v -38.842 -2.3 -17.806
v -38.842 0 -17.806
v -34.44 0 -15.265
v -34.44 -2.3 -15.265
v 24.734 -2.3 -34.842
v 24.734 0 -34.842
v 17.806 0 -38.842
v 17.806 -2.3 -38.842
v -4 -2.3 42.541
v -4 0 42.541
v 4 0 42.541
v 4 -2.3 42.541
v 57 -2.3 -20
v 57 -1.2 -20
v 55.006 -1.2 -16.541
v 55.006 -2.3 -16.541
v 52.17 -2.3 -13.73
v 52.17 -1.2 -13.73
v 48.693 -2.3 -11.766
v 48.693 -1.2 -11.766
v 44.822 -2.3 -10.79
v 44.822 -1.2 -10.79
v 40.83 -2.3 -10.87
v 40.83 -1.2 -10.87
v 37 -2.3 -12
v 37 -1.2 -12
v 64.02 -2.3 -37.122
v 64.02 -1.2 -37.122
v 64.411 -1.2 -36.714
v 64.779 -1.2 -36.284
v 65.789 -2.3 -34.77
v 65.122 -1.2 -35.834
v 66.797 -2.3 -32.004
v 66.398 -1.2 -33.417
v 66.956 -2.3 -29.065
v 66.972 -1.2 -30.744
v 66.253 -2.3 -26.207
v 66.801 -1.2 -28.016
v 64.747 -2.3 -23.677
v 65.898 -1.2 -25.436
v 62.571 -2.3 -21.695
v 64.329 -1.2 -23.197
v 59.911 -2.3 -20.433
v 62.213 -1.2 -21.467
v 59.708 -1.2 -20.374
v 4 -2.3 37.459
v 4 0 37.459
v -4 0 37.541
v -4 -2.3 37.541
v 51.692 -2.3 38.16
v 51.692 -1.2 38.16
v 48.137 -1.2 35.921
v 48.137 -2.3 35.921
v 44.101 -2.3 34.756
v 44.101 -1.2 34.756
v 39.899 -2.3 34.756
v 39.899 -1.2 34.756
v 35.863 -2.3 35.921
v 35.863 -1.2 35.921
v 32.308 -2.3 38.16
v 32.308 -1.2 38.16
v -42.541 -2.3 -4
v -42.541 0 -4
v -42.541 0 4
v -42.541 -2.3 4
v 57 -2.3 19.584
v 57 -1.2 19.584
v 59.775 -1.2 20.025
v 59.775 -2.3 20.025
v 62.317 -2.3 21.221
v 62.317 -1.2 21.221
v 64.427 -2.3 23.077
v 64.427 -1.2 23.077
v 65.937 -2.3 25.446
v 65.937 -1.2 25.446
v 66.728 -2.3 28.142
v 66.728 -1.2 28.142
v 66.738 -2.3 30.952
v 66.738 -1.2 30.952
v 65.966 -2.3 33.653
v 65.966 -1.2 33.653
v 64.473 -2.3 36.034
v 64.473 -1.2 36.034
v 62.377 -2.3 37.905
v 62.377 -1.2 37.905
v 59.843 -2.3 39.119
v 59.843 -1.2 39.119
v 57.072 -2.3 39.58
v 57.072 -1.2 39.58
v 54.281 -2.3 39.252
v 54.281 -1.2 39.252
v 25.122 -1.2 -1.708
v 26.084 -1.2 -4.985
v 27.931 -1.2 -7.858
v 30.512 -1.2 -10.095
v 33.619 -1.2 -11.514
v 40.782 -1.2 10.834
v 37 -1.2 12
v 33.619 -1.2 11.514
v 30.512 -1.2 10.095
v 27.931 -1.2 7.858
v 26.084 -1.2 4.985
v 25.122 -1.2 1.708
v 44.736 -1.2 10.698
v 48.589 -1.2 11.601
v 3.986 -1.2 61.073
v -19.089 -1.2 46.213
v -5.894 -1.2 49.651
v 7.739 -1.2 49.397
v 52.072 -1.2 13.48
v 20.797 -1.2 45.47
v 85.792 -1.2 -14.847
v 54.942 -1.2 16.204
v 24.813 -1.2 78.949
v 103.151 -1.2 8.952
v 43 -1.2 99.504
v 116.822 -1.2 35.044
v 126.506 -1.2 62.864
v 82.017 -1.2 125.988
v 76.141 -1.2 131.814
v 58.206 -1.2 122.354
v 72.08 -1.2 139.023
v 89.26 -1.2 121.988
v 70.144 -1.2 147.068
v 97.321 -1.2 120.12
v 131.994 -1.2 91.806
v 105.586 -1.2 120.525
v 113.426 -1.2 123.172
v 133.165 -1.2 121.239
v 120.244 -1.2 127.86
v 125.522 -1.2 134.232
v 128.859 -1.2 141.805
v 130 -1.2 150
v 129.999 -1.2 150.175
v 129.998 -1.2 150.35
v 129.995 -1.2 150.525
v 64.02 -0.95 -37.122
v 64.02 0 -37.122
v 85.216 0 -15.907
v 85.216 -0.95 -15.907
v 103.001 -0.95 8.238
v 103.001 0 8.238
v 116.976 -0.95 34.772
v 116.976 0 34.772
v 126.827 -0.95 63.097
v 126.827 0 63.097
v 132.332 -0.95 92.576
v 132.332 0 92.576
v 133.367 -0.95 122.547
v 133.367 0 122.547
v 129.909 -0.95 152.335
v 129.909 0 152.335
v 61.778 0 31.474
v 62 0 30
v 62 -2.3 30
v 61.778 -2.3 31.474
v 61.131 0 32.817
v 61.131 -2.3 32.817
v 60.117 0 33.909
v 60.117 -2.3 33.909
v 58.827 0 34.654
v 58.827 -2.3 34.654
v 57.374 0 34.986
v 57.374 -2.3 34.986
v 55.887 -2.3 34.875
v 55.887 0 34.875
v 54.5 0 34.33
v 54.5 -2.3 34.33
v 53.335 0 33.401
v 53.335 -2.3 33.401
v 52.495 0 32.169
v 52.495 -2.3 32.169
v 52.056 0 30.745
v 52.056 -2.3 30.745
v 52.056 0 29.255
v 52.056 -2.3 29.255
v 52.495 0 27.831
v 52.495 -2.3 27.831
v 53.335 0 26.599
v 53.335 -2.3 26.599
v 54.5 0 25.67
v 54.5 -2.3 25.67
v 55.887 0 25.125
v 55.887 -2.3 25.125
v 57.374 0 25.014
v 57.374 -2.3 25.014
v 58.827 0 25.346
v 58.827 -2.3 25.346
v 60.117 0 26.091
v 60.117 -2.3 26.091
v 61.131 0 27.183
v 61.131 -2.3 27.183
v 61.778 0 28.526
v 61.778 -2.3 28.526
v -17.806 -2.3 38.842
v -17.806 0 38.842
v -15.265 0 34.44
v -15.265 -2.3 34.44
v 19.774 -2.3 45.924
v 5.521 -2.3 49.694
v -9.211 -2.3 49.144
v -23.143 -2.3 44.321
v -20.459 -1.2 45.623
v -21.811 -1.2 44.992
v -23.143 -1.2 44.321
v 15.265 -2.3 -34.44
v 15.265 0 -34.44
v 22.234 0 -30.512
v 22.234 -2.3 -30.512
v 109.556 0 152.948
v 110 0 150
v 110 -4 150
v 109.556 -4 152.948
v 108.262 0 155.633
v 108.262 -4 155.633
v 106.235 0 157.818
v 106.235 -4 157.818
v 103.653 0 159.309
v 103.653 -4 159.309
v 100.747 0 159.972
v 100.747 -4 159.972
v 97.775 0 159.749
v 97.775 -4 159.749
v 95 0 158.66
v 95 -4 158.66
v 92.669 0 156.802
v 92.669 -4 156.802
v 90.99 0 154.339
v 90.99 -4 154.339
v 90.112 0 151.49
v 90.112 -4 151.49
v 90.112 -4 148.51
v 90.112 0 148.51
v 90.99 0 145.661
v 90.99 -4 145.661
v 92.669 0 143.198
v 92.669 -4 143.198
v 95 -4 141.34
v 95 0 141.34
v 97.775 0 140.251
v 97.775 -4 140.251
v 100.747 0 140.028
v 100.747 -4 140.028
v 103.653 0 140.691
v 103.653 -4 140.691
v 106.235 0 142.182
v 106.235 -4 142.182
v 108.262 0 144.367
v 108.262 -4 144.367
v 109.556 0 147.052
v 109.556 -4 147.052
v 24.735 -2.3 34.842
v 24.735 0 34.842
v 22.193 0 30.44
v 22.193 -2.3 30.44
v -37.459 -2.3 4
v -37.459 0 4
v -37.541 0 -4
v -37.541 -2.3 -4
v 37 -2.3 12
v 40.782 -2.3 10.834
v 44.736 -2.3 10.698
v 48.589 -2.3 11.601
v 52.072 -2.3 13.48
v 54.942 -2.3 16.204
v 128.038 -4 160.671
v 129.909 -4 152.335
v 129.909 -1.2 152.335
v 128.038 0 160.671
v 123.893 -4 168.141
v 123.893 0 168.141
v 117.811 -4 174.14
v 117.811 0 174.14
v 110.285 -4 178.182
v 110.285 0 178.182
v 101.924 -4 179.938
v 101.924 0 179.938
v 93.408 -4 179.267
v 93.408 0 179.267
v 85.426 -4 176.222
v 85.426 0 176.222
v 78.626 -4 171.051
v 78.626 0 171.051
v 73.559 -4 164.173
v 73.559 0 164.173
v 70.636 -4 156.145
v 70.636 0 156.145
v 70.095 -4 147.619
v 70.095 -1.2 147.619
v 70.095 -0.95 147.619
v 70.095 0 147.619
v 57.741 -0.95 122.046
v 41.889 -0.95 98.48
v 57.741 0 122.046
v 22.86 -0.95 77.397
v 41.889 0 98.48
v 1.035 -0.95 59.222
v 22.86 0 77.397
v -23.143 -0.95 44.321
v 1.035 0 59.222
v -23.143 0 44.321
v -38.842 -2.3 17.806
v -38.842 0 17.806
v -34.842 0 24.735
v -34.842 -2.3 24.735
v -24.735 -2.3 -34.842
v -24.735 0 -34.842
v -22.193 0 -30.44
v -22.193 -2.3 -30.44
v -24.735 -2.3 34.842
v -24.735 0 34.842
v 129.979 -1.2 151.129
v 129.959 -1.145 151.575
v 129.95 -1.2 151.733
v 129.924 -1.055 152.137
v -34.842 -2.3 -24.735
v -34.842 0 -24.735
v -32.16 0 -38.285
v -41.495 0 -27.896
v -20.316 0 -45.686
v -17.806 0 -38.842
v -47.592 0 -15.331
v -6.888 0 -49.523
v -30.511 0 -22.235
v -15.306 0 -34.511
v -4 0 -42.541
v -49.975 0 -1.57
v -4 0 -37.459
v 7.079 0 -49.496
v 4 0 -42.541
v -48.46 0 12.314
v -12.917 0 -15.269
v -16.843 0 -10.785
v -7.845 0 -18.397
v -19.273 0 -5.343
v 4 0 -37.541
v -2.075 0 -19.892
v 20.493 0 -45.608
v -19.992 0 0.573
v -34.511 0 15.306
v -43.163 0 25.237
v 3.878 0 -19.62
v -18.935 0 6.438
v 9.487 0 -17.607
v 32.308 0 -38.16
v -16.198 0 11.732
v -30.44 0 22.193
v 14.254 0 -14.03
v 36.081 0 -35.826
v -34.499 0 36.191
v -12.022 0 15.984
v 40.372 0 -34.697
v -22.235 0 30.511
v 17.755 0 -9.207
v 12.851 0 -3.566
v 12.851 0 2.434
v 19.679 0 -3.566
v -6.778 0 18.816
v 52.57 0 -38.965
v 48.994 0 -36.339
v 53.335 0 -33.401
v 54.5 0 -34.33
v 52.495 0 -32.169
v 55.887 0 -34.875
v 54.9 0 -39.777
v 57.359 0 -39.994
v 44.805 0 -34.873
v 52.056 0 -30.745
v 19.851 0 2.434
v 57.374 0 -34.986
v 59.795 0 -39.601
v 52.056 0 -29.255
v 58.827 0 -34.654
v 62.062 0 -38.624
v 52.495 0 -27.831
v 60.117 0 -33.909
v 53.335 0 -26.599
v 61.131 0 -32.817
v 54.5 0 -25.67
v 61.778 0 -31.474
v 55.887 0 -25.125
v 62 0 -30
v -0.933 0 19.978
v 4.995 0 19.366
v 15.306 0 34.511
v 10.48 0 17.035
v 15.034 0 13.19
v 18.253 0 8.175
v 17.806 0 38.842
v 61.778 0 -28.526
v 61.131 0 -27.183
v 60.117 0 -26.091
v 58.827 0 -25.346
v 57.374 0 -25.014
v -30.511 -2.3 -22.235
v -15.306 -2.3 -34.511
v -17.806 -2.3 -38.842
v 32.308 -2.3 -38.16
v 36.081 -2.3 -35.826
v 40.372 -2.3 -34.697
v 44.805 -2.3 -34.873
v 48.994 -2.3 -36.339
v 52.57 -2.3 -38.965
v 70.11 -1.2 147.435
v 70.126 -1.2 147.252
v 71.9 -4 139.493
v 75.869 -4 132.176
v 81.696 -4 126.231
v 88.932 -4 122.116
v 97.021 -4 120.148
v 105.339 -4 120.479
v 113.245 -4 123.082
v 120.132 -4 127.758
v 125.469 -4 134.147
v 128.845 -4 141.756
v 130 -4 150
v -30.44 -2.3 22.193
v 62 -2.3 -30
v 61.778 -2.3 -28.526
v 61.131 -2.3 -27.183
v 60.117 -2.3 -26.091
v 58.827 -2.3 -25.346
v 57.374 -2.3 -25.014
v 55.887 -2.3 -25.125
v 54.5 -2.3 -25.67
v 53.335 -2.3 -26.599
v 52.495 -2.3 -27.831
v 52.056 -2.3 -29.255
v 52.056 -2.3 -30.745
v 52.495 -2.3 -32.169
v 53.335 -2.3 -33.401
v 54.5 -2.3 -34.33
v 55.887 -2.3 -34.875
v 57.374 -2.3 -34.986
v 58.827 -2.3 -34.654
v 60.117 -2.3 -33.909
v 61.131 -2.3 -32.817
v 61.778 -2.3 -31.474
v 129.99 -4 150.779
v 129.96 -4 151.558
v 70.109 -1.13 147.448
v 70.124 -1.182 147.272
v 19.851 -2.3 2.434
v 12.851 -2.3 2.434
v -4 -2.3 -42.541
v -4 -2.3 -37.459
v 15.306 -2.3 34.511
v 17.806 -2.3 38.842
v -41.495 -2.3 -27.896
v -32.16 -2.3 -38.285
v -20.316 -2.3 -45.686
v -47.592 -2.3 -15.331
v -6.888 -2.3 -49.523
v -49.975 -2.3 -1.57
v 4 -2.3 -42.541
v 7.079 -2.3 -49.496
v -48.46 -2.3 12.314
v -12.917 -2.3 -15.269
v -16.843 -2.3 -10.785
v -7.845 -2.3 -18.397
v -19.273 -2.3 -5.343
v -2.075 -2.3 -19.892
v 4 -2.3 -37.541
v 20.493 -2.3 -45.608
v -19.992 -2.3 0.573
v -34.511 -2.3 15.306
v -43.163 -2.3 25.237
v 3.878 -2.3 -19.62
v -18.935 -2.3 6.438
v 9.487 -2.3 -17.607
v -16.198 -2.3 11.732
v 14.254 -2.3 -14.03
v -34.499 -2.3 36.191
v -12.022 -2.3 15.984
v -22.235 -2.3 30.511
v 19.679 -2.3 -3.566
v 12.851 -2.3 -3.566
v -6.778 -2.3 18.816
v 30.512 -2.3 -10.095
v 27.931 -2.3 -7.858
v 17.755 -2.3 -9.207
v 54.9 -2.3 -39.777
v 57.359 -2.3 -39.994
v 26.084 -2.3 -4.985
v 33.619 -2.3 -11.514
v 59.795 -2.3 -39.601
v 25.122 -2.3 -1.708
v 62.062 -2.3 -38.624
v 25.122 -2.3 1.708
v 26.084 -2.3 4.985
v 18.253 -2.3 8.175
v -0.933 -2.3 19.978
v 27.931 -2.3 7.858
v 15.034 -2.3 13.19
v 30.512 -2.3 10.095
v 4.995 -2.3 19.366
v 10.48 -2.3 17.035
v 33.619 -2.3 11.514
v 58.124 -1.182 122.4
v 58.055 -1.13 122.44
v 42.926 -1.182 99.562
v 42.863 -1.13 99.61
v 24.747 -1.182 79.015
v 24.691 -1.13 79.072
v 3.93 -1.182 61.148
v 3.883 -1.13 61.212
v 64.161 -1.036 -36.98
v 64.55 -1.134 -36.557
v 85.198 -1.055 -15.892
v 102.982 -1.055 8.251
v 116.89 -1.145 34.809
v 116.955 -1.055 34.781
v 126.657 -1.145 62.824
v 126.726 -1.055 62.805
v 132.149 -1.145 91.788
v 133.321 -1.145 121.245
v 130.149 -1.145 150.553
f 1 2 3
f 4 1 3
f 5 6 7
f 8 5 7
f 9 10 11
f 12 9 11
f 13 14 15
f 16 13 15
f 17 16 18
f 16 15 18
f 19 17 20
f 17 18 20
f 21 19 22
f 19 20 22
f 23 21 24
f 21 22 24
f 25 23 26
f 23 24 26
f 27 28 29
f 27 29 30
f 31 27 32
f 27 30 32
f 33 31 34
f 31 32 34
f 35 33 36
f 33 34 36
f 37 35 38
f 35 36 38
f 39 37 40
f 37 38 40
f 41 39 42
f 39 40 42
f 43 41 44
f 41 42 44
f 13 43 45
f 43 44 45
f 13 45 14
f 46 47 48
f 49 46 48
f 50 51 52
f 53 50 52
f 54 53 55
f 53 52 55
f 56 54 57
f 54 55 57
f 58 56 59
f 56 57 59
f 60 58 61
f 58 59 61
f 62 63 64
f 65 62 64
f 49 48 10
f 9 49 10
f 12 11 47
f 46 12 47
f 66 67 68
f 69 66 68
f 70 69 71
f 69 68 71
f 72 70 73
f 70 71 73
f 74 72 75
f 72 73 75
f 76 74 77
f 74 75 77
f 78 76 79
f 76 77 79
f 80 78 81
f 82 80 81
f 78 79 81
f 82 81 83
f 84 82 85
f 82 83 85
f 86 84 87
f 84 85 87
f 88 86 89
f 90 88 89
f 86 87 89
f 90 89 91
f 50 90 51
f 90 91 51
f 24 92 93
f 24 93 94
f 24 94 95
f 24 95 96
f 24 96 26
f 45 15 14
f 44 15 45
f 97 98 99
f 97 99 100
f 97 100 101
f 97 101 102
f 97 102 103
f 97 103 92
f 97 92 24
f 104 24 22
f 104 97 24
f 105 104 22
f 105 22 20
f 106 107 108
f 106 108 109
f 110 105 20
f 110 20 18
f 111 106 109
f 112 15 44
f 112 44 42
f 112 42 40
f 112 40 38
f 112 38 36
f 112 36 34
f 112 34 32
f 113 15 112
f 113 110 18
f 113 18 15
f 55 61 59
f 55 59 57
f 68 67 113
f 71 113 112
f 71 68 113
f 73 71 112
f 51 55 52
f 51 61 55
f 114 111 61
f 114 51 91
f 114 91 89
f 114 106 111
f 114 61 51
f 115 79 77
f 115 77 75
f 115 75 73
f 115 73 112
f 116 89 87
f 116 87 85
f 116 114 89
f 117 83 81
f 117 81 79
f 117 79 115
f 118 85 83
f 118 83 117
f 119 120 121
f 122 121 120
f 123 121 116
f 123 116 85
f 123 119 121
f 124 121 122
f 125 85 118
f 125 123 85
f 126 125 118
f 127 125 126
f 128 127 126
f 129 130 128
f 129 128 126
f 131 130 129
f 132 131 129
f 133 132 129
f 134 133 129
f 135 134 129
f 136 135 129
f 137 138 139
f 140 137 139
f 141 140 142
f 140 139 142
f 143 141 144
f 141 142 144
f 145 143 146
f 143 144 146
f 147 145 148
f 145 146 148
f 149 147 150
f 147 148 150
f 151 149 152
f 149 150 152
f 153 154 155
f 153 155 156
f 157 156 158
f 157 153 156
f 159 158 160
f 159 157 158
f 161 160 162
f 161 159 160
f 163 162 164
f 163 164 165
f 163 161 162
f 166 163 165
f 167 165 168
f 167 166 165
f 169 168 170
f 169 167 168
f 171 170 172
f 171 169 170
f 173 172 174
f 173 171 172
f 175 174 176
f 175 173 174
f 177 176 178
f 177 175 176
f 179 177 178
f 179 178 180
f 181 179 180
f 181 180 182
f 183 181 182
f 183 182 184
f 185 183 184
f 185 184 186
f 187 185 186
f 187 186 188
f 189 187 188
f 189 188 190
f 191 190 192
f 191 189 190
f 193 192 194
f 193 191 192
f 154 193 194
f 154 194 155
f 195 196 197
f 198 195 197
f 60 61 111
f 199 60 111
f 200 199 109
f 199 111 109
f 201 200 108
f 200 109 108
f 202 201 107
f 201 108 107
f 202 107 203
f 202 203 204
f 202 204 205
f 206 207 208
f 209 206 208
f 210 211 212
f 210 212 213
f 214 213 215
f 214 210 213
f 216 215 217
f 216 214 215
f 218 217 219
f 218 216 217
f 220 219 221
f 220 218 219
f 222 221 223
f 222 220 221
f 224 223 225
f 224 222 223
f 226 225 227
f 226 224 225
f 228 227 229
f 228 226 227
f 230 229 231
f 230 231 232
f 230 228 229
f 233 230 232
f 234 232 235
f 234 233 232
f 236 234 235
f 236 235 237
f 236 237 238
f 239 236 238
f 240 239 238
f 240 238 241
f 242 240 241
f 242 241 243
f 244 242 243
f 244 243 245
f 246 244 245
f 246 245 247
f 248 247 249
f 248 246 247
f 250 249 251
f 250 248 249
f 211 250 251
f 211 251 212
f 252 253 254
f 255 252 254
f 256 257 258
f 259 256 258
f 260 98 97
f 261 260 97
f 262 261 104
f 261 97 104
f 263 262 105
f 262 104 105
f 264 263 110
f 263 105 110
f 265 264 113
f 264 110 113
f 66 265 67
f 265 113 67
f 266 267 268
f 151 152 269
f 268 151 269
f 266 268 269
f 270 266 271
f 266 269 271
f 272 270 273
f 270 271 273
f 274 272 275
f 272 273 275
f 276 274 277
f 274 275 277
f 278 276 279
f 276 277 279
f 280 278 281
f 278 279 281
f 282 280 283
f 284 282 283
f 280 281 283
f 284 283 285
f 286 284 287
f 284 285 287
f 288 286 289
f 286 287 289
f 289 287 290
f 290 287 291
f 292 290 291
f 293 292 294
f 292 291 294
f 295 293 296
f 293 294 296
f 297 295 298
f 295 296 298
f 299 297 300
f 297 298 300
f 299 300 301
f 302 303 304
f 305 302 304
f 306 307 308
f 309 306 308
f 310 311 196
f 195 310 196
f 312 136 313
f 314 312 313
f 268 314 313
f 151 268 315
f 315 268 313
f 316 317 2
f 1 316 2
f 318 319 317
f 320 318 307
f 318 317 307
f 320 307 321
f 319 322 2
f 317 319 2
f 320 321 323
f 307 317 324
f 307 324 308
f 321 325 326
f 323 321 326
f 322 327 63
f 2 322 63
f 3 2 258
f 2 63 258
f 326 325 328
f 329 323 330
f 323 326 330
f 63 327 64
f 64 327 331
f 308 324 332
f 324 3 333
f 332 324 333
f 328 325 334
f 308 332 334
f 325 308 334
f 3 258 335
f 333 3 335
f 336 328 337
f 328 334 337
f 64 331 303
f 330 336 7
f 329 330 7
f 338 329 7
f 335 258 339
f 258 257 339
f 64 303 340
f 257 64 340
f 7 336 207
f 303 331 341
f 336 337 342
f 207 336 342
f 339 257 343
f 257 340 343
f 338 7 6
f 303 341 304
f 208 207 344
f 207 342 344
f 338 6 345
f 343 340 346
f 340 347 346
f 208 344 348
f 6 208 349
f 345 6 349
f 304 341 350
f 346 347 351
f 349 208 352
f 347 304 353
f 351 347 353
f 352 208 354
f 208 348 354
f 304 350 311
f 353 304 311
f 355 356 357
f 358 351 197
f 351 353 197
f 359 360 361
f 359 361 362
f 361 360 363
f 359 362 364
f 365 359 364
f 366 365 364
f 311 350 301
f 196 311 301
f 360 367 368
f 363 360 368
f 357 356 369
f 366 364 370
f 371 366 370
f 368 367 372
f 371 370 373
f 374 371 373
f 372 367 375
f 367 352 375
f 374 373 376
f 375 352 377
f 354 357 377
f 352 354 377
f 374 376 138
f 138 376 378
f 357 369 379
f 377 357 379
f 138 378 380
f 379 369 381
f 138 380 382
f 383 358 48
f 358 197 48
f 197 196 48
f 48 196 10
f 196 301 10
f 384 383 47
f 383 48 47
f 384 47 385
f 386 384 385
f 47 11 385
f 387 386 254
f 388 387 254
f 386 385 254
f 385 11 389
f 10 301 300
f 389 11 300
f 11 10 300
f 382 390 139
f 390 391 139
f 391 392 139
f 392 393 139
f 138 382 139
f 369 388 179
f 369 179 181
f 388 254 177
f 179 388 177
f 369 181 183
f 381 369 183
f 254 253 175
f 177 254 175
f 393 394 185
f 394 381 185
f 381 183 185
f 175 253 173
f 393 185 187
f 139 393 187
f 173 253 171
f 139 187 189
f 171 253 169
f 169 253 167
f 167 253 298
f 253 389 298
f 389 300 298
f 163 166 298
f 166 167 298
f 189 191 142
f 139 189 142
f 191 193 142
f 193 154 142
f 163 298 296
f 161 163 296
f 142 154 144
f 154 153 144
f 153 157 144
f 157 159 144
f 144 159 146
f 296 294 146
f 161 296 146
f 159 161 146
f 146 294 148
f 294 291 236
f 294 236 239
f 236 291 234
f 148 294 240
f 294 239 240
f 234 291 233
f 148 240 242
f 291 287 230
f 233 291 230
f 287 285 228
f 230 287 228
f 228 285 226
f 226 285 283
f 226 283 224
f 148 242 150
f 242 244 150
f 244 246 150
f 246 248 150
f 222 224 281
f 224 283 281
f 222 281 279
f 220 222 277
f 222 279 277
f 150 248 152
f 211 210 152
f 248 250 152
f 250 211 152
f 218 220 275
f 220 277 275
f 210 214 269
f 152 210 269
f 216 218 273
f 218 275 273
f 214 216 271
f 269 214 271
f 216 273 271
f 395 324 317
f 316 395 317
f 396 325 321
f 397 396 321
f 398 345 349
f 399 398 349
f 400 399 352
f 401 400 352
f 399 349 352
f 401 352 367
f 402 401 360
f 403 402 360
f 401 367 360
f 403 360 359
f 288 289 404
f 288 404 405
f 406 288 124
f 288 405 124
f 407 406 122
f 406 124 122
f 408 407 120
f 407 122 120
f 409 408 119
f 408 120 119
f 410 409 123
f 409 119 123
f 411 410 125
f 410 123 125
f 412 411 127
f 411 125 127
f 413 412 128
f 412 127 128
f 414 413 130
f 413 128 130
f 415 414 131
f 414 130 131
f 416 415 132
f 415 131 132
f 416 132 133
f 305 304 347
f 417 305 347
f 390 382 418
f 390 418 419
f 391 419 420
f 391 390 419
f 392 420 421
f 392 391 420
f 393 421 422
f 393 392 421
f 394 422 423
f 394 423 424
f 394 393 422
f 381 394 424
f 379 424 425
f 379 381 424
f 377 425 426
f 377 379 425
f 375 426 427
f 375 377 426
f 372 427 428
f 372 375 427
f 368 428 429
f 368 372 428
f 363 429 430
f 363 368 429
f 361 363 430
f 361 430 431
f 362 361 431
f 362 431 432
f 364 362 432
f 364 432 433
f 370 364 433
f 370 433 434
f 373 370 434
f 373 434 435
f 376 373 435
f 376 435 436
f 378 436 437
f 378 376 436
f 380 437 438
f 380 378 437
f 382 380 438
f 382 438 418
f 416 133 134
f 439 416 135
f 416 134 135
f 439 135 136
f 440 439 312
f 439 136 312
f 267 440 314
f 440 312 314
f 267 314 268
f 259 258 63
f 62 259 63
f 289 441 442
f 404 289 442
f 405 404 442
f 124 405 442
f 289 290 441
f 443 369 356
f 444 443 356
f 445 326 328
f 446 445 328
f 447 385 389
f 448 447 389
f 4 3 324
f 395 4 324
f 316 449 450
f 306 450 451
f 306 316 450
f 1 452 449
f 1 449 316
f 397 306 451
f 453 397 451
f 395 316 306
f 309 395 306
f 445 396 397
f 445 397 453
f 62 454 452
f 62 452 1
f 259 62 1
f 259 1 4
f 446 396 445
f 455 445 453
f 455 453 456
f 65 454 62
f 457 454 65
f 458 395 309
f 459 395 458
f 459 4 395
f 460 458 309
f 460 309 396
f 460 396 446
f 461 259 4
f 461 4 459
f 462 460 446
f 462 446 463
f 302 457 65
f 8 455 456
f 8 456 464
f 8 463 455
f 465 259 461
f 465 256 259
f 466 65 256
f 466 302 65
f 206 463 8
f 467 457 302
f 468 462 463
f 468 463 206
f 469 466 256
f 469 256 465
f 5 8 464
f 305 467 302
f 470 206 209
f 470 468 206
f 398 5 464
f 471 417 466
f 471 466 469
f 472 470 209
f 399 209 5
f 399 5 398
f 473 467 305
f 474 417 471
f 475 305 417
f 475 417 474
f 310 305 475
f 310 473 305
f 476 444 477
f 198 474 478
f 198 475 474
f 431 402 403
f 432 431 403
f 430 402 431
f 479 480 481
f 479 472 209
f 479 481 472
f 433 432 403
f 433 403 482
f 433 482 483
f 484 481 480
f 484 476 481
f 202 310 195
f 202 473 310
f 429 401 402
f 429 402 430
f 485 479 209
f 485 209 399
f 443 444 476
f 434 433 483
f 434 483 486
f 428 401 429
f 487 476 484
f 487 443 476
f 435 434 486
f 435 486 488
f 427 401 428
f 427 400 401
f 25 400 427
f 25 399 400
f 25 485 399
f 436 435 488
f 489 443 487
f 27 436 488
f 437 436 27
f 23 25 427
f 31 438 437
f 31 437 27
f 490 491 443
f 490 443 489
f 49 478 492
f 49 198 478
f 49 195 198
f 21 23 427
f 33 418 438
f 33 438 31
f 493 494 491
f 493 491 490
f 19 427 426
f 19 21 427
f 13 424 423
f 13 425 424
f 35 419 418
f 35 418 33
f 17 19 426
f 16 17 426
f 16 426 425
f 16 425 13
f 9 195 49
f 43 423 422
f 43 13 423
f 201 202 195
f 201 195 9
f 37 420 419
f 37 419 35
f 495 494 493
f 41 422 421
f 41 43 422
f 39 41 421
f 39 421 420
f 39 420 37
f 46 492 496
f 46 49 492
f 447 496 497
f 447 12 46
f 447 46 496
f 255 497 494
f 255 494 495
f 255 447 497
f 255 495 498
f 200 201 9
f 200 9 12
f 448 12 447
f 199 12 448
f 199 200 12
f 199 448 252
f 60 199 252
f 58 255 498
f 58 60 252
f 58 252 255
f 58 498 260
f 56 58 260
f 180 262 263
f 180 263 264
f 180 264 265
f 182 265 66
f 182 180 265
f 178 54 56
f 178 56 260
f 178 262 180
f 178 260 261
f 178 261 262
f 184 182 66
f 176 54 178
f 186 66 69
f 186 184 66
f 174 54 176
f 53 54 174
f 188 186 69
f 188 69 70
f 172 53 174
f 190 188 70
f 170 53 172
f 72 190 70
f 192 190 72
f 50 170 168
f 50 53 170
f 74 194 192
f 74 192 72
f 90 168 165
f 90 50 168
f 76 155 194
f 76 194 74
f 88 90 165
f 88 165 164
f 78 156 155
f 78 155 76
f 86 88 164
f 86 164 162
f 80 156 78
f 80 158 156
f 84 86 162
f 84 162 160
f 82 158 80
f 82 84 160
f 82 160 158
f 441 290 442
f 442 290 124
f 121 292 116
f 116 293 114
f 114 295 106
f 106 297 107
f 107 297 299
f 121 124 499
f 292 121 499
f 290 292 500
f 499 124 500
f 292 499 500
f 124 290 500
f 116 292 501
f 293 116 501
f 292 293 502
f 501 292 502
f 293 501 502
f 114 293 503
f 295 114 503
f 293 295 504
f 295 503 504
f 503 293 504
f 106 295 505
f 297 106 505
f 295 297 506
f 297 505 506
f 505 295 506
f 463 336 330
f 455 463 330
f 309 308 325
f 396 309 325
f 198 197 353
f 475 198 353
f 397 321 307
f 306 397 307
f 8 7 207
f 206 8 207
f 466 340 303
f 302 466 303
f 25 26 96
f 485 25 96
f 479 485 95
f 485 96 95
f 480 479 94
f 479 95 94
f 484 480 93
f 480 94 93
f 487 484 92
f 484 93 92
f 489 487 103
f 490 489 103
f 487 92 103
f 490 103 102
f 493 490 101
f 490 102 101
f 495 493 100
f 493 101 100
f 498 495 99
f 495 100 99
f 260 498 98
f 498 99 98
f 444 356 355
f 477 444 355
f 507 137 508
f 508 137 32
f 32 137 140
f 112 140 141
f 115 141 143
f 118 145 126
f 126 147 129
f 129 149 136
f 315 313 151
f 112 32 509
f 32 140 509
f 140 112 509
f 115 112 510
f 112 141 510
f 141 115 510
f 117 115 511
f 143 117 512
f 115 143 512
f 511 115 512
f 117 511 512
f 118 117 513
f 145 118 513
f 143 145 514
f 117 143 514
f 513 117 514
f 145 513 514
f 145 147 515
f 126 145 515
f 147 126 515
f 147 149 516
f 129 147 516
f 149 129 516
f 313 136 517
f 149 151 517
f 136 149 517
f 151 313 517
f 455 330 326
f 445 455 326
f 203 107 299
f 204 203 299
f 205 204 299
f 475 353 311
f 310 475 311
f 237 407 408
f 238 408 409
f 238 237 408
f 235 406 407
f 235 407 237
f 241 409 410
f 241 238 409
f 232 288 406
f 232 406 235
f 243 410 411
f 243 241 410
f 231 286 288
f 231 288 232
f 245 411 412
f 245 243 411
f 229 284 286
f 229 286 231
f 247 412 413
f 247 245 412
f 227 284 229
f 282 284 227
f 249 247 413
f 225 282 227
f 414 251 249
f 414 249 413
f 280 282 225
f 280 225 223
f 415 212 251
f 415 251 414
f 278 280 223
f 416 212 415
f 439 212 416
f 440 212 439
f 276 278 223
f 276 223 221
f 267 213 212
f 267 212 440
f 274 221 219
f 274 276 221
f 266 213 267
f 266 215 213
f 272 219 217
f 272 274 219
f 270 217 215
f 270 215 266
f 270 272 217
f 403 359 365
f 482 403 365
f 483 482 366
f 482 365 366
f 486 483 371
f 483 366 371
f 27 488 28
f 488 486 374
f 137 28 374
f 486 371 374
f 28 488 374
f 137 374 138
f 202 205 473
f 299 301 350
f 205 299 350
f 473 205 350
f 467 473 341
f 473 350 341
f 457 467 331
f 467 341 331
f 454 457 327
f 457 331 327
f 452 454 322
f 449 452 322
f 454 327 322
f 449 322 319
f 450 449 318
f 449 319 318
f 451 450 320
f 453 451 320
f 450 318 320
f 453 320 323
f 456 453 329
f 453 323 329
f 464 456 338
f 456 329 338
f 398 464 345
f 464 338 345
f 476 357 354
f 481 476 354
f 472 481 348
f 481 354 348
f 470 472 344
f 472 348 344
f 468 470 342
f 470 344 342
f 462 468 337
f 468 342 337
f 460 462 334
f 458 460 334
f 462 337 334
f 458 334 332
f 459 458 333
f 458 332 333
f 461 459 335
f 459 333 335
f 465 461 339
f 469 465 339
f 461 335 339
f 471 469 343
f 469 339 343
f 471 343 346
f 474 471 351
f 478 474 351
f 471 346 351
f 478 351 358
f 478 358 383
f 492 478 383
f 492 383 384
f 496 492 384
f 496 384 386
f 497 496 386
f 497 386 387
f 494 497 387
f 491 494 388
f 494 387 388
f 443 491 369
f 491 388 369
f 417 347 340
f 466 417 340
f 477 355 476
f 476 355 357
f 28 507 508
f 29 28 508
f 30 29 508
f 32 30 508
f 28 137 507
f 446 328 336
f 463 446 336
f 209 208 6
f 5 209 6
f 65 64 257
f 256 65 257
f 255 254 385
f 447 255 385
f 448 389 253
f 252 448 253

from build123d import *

# Parameters (mm, degrees)
F0_R        = 5
F1_DEPTH    = 2.3
F2_DEPTH    = 1.2
F0_R_2      = 10
F3_DEPTH    = 4
F4_T4_ANGLE = 61.2690035525
F4_S5_R     = 30
F4_T6_DEPTH = 114
F4_S7_R     = 10
F4_T8_DEPTH = 114
F5_T4_ANGLE = 41.074053593
F5_S5_R     = 30
F5_T6_DEPTH = 82
F5_S7_R     = 50
F5_T8_DEPTH = 82


# Not quite as in the source:
# - a fillet or chamfer that OpenCascade refuses, or shapes differently, is made with other operations: its cross-section is extruded or revolved along the edge and cut away or added


with BuildPart() as f1:
    # F0 (on Front) → F1 (new body)
    with BuildSketch(Plane.XZ):
        with BuildLine():
            ThreePointArc((51.6923076923, 38.1603592456), (42, 34.6084670192), (32.3076923077, 38.1603592456))
            ThreePointArc((32.3076923077, 38.1603592456), (5.5214165196, 49.6942044872), (-23.1433206058, 44.3214024072))
            ThreePointArc((-23.1433206058, 44.3214024072), (-41.4946584334, -27.8961166023), (32.3076923077, -38.1603592456))
            ThreePointArc((32.3076923077, -38.1603592456), (42.5952420348, -34.6202821085), (52.5696525848, -38.9650444383))
            ThreePointArc((52.5696525848, -38.9650444383), (58.5892524469, -39.8729061912), (64.0198786028, -37.1218891035))
            ThreePointArc((64.0198786028, -37.1218891035), (66.2525372476, -26.2065115681), (57, -20))
            ThreePointArc((57, -20), (48.6934276496, -11.7664308759), (37, -12))
            ThreePointArc((37, -12), (25, 0), (37, 12))
            ThreePointArc((37, 12), (48.5892751146, 11.6008362262), (57, 19.5839644541))
            ThreePointArc((57, 19.5839644541), (66.4476997873, 32.3298447331), (51.6923076923, 38.1603592456))
        make_face()
        Polygon((-15.306354845, -34.5113842702), (-17.806354845, -38.8415112891), (-24.7345580753, -34.8415112891), (-22.1933950155, -30.4400877594), align=None, mode=Mode.SUBTRACT)
        Polygon((-30.5113842702, -22.2345580753), (-34.8415112891, -24.7345580753), (-38.8415112891, -17.806354845), (-34.4400877594, -15.2651917853), align=None, mode=Mode.SUBTRACT)
        Polygon((-37.5409129203, -4), (-42.5409129203, -4), (-42.5409129203, 4), (-37.4585868008, 4), align=None, mode=Mode.SUBTRACT)
        Polygon((3.9995764343, -37.5409085614), (3.9995764343, -42.5409129203), (-4, -42.5409129203), (-4, -37.4585868008), align=None, mode=Mode.SUBTRACT)
        Polygon((22.2341890772, -30.5115922782), (24.7341890772, -34.8417192971), (17.8063526656, -38.8415075143), (15.2651917853, -34.4400877594), align=None, mode=Mode.SUBTRACT)
        with BuildLine():
            Line((19.8513816884, 2.433648508), (12.8513816884, 2.433648508))
            Line((12.8513816884, 2.433648508), (12.8513816884, -3.566351492))
            Line((12.8513816884, -3.566351492), (19.679459775, -3.566351492))
            ThreePointArc((19.679459775, -3.566351492), (-19.9917947344, 0.572837934), (19.8513816884, 2.433648508))
        make_face(mode=Mode.SUBTRACT)
        Polygon((-34.5113842702, 15.306354845), (-38.8415112891, 17.806354845), (-34.8415112891, 24.7345580753), (-30.4400877594, 22.1933950155), align=None, mode=Mode.SUBTRACT)
        Polygon((-22.2345580753, 30.5113842702), (-24.7345580753, 34.8415112891), (-17.806354845, 38.8415112891), (-15.2651917853, 34.4400877594), align=None, mode=Mode.SUBTRACT)
        Polygon((15.306354845, 34.5113842702), (17.806354845, 38.8415112891), (24.7345580753, 34.8415112891), (22.1933950155, 30.4400877594), align=None, mode=Mode.SUBTRACT)
        Polygon((-4, 37.5409129203), (-4, 42.5409129203), (4, 42.5409129203), (4, 37.4585868008), align=None, mode=Mode.SUBTRACT)
        with Locations((57, -30)):
            Circle(F0_R, mode=Mode.SUBTRACT)
        with Locations((57, 30)):
            Circle(F0_R, mode=Mode.SUBTRACT)
    extrude(amount=F1_DEPTH)

    # F0 (on Front) → F2 (join)
    with BuildSketch(Plane.XZ):
        with BuildLine():
            ThreePointArc((-23.1433206058, 44.3214024072), (5.5214165196, 49.6942044872), (32.3076923077, 38.1603592456))
            ThreePointArc((32.3076923077, 38.1603592456), (42, 34.6084670192), (51.6923076923, 38.1603592456))
            ThreePointArc((51.6923076923, 38.1603592456), (66.4476997873, 32.3298447331), (57, 19.5839644541))
            ThreePointArc((57, 19.5839644541), (48.5892751146, 11.6008362262), (37, 12))
            ThreePointArc((37, 12), (25, 0), (37, -12))
            ThreePointArc((37, -12), (48.6934276496, -11.7664308759), (57, -20))
            ThreePointArc((57, -20), (66.2525372476, -26.2065115681), (64.0198786028, -37.1218891035))
            ThreePointArc((64.0198786028, -37.1218891035), (122.4330747785, 48.7493192224), (129.9089599648, 152.3354044245))
            ThreePointArc((129.9089599648, 152.3354044245), (129.977231351, 151.1685891188), (130, 150))
            ThreePointArc((130, 150), (101.1913208393, 120.0236634217), (70.0946163561, 147.6192377033))
            ThreePointArc((70.0946163561, 147.6192377033), (32.7491957463, 87.5998980678), (-23.1433206058, 44.3214024072))
        make_face()
    extrude(amount=F2_DEPTH)

    # F0 (on Front) → F3 (join)
    with BuildSketch(Plane.XZ):
        with BuildLine():
            ThreePointArc((129.9089599648, 152.3354044245), (97.6419159614, 179.9071804032), (70.0946163561, 147.6192377033))
            ThreePointArc((70.0946163561, 147.6192377033), (101.1913208393, 120.0236634217), (130, 150))
            ThreePointArc((130, 150), (129.977231351, 151.1685891188), (129.9089599648, 152.3354044245))
        make_face()
        with Locations((100, 150)):
            Circle(F0_R_2, mode=Mode.SUBTRACT)
    extrude(amount=F3_DEPTH)

    # F4: fillet of radius 0.25 on 1 edges, made by hand


with BuildPart() as f4_tool2:
    # F4_s3 → F4_t4 (revolve)
    with BuildSketch(Plane(origin=(17.0947609574, 0, 14.2583854823), x_dir=(0, 1, 0), z_dir=(-0.7679394892, 0, -0.6405223969))):
        with BuildLine():
            ThreePointArc((-1.2, 69.2879529885), (-1.1267766953, 69.4647296838), (-0.95, 69.5379529885))
            Line((-0.95, 69.5379529885), (-1.2, 69.5379529885))
            Line((-1.2, 69.5379529885), (-1.2, 69.2879529885))
        make_face()
    revolve(axis=Axis((-66.469102104, -1.2, 114.4453432197), (0, -1, 0)), revolution_arc=F4_T4_ANGLE)

    # F4_s5 → F4_t6 (cut, symmetric)
    with BuildSketch(Plane.XZ.offset(1)):
        with Locations((100, 150)):
            Circle(F4_S5_R)
    extrude(amount=F4_T6_DEPTH, both=True, mode=Mode.SUBTRACT)

    # F4_s7 → F4_t8 (cut, symmetric)
    with BuildSketch(Plane.XZ.offset(1)):
        with Locations((57, -30)):
            Circle(F4_S7_R)
    extrude(amount=F4_T8_DEPTH, both=True, mode=Mode.SUBTRACT)


with BuildPart() as f1_1:
    add(f1.part)

    # F4_t1: cut F4_tool2
    add(f4_tool2.part, mode=Mode.SUBTRACT)

    # F5: fillet of radius 0.25 on 1 edges, made by hand


with BuildPart() as f5_tool2:
    # F5_s3 → F5_t4 (revolve)
    with BuildSketch(Plane(origin=(60.0718928504, 0, 152.245866678), x_dir=(0, 1, 0), z_dir=(0.3670335308, 0, 0.9302077119))):
        with BuildLine():
            ThreePointArc((-1.2, -11.2723193897), (-1.1267766953, -11.0955426945), (-0.95, -11.0223193897))
            Line((-0.95, -11.0223193897), (-1.2, -11.0223193897))
            Line((-1.2, -11.0223193897), (-1.2, -11.2723193897))
        make_face()
    revolve(axis=Axis((-115.7166030288, -1.2, 221.6070120359), (0, 1, 0)), revolution_arc=F5_T4_ANGLE)

    # F5_s5 → F5_t6 (cut, symmetric)
    with BuildSketch(Plane.XZ.offset(1)):
        with Locations((100, 150)):
            Circle(F5_S5_R)
    extrude(amount=F5_T6_DEPTH, both=True, mode=Mode.SUBTRACT)

    # F5_s7 → F5_t8 (cut, symmetric)
    with BuildSketch(Plane.XZ.offset(1)):
        Circle(F5_S7_R)
    extrude(amount=F5_T8_DEPTH, both=True, mode=Mode.SUBTRACT)


with BuildPart() as f1_2:
    add(f1_1.part)

    # F5_t1: cut F5_tool2
    add(f5_tool2.part, mode=Mode.SUBTRACT)


solid = f1_2.part
